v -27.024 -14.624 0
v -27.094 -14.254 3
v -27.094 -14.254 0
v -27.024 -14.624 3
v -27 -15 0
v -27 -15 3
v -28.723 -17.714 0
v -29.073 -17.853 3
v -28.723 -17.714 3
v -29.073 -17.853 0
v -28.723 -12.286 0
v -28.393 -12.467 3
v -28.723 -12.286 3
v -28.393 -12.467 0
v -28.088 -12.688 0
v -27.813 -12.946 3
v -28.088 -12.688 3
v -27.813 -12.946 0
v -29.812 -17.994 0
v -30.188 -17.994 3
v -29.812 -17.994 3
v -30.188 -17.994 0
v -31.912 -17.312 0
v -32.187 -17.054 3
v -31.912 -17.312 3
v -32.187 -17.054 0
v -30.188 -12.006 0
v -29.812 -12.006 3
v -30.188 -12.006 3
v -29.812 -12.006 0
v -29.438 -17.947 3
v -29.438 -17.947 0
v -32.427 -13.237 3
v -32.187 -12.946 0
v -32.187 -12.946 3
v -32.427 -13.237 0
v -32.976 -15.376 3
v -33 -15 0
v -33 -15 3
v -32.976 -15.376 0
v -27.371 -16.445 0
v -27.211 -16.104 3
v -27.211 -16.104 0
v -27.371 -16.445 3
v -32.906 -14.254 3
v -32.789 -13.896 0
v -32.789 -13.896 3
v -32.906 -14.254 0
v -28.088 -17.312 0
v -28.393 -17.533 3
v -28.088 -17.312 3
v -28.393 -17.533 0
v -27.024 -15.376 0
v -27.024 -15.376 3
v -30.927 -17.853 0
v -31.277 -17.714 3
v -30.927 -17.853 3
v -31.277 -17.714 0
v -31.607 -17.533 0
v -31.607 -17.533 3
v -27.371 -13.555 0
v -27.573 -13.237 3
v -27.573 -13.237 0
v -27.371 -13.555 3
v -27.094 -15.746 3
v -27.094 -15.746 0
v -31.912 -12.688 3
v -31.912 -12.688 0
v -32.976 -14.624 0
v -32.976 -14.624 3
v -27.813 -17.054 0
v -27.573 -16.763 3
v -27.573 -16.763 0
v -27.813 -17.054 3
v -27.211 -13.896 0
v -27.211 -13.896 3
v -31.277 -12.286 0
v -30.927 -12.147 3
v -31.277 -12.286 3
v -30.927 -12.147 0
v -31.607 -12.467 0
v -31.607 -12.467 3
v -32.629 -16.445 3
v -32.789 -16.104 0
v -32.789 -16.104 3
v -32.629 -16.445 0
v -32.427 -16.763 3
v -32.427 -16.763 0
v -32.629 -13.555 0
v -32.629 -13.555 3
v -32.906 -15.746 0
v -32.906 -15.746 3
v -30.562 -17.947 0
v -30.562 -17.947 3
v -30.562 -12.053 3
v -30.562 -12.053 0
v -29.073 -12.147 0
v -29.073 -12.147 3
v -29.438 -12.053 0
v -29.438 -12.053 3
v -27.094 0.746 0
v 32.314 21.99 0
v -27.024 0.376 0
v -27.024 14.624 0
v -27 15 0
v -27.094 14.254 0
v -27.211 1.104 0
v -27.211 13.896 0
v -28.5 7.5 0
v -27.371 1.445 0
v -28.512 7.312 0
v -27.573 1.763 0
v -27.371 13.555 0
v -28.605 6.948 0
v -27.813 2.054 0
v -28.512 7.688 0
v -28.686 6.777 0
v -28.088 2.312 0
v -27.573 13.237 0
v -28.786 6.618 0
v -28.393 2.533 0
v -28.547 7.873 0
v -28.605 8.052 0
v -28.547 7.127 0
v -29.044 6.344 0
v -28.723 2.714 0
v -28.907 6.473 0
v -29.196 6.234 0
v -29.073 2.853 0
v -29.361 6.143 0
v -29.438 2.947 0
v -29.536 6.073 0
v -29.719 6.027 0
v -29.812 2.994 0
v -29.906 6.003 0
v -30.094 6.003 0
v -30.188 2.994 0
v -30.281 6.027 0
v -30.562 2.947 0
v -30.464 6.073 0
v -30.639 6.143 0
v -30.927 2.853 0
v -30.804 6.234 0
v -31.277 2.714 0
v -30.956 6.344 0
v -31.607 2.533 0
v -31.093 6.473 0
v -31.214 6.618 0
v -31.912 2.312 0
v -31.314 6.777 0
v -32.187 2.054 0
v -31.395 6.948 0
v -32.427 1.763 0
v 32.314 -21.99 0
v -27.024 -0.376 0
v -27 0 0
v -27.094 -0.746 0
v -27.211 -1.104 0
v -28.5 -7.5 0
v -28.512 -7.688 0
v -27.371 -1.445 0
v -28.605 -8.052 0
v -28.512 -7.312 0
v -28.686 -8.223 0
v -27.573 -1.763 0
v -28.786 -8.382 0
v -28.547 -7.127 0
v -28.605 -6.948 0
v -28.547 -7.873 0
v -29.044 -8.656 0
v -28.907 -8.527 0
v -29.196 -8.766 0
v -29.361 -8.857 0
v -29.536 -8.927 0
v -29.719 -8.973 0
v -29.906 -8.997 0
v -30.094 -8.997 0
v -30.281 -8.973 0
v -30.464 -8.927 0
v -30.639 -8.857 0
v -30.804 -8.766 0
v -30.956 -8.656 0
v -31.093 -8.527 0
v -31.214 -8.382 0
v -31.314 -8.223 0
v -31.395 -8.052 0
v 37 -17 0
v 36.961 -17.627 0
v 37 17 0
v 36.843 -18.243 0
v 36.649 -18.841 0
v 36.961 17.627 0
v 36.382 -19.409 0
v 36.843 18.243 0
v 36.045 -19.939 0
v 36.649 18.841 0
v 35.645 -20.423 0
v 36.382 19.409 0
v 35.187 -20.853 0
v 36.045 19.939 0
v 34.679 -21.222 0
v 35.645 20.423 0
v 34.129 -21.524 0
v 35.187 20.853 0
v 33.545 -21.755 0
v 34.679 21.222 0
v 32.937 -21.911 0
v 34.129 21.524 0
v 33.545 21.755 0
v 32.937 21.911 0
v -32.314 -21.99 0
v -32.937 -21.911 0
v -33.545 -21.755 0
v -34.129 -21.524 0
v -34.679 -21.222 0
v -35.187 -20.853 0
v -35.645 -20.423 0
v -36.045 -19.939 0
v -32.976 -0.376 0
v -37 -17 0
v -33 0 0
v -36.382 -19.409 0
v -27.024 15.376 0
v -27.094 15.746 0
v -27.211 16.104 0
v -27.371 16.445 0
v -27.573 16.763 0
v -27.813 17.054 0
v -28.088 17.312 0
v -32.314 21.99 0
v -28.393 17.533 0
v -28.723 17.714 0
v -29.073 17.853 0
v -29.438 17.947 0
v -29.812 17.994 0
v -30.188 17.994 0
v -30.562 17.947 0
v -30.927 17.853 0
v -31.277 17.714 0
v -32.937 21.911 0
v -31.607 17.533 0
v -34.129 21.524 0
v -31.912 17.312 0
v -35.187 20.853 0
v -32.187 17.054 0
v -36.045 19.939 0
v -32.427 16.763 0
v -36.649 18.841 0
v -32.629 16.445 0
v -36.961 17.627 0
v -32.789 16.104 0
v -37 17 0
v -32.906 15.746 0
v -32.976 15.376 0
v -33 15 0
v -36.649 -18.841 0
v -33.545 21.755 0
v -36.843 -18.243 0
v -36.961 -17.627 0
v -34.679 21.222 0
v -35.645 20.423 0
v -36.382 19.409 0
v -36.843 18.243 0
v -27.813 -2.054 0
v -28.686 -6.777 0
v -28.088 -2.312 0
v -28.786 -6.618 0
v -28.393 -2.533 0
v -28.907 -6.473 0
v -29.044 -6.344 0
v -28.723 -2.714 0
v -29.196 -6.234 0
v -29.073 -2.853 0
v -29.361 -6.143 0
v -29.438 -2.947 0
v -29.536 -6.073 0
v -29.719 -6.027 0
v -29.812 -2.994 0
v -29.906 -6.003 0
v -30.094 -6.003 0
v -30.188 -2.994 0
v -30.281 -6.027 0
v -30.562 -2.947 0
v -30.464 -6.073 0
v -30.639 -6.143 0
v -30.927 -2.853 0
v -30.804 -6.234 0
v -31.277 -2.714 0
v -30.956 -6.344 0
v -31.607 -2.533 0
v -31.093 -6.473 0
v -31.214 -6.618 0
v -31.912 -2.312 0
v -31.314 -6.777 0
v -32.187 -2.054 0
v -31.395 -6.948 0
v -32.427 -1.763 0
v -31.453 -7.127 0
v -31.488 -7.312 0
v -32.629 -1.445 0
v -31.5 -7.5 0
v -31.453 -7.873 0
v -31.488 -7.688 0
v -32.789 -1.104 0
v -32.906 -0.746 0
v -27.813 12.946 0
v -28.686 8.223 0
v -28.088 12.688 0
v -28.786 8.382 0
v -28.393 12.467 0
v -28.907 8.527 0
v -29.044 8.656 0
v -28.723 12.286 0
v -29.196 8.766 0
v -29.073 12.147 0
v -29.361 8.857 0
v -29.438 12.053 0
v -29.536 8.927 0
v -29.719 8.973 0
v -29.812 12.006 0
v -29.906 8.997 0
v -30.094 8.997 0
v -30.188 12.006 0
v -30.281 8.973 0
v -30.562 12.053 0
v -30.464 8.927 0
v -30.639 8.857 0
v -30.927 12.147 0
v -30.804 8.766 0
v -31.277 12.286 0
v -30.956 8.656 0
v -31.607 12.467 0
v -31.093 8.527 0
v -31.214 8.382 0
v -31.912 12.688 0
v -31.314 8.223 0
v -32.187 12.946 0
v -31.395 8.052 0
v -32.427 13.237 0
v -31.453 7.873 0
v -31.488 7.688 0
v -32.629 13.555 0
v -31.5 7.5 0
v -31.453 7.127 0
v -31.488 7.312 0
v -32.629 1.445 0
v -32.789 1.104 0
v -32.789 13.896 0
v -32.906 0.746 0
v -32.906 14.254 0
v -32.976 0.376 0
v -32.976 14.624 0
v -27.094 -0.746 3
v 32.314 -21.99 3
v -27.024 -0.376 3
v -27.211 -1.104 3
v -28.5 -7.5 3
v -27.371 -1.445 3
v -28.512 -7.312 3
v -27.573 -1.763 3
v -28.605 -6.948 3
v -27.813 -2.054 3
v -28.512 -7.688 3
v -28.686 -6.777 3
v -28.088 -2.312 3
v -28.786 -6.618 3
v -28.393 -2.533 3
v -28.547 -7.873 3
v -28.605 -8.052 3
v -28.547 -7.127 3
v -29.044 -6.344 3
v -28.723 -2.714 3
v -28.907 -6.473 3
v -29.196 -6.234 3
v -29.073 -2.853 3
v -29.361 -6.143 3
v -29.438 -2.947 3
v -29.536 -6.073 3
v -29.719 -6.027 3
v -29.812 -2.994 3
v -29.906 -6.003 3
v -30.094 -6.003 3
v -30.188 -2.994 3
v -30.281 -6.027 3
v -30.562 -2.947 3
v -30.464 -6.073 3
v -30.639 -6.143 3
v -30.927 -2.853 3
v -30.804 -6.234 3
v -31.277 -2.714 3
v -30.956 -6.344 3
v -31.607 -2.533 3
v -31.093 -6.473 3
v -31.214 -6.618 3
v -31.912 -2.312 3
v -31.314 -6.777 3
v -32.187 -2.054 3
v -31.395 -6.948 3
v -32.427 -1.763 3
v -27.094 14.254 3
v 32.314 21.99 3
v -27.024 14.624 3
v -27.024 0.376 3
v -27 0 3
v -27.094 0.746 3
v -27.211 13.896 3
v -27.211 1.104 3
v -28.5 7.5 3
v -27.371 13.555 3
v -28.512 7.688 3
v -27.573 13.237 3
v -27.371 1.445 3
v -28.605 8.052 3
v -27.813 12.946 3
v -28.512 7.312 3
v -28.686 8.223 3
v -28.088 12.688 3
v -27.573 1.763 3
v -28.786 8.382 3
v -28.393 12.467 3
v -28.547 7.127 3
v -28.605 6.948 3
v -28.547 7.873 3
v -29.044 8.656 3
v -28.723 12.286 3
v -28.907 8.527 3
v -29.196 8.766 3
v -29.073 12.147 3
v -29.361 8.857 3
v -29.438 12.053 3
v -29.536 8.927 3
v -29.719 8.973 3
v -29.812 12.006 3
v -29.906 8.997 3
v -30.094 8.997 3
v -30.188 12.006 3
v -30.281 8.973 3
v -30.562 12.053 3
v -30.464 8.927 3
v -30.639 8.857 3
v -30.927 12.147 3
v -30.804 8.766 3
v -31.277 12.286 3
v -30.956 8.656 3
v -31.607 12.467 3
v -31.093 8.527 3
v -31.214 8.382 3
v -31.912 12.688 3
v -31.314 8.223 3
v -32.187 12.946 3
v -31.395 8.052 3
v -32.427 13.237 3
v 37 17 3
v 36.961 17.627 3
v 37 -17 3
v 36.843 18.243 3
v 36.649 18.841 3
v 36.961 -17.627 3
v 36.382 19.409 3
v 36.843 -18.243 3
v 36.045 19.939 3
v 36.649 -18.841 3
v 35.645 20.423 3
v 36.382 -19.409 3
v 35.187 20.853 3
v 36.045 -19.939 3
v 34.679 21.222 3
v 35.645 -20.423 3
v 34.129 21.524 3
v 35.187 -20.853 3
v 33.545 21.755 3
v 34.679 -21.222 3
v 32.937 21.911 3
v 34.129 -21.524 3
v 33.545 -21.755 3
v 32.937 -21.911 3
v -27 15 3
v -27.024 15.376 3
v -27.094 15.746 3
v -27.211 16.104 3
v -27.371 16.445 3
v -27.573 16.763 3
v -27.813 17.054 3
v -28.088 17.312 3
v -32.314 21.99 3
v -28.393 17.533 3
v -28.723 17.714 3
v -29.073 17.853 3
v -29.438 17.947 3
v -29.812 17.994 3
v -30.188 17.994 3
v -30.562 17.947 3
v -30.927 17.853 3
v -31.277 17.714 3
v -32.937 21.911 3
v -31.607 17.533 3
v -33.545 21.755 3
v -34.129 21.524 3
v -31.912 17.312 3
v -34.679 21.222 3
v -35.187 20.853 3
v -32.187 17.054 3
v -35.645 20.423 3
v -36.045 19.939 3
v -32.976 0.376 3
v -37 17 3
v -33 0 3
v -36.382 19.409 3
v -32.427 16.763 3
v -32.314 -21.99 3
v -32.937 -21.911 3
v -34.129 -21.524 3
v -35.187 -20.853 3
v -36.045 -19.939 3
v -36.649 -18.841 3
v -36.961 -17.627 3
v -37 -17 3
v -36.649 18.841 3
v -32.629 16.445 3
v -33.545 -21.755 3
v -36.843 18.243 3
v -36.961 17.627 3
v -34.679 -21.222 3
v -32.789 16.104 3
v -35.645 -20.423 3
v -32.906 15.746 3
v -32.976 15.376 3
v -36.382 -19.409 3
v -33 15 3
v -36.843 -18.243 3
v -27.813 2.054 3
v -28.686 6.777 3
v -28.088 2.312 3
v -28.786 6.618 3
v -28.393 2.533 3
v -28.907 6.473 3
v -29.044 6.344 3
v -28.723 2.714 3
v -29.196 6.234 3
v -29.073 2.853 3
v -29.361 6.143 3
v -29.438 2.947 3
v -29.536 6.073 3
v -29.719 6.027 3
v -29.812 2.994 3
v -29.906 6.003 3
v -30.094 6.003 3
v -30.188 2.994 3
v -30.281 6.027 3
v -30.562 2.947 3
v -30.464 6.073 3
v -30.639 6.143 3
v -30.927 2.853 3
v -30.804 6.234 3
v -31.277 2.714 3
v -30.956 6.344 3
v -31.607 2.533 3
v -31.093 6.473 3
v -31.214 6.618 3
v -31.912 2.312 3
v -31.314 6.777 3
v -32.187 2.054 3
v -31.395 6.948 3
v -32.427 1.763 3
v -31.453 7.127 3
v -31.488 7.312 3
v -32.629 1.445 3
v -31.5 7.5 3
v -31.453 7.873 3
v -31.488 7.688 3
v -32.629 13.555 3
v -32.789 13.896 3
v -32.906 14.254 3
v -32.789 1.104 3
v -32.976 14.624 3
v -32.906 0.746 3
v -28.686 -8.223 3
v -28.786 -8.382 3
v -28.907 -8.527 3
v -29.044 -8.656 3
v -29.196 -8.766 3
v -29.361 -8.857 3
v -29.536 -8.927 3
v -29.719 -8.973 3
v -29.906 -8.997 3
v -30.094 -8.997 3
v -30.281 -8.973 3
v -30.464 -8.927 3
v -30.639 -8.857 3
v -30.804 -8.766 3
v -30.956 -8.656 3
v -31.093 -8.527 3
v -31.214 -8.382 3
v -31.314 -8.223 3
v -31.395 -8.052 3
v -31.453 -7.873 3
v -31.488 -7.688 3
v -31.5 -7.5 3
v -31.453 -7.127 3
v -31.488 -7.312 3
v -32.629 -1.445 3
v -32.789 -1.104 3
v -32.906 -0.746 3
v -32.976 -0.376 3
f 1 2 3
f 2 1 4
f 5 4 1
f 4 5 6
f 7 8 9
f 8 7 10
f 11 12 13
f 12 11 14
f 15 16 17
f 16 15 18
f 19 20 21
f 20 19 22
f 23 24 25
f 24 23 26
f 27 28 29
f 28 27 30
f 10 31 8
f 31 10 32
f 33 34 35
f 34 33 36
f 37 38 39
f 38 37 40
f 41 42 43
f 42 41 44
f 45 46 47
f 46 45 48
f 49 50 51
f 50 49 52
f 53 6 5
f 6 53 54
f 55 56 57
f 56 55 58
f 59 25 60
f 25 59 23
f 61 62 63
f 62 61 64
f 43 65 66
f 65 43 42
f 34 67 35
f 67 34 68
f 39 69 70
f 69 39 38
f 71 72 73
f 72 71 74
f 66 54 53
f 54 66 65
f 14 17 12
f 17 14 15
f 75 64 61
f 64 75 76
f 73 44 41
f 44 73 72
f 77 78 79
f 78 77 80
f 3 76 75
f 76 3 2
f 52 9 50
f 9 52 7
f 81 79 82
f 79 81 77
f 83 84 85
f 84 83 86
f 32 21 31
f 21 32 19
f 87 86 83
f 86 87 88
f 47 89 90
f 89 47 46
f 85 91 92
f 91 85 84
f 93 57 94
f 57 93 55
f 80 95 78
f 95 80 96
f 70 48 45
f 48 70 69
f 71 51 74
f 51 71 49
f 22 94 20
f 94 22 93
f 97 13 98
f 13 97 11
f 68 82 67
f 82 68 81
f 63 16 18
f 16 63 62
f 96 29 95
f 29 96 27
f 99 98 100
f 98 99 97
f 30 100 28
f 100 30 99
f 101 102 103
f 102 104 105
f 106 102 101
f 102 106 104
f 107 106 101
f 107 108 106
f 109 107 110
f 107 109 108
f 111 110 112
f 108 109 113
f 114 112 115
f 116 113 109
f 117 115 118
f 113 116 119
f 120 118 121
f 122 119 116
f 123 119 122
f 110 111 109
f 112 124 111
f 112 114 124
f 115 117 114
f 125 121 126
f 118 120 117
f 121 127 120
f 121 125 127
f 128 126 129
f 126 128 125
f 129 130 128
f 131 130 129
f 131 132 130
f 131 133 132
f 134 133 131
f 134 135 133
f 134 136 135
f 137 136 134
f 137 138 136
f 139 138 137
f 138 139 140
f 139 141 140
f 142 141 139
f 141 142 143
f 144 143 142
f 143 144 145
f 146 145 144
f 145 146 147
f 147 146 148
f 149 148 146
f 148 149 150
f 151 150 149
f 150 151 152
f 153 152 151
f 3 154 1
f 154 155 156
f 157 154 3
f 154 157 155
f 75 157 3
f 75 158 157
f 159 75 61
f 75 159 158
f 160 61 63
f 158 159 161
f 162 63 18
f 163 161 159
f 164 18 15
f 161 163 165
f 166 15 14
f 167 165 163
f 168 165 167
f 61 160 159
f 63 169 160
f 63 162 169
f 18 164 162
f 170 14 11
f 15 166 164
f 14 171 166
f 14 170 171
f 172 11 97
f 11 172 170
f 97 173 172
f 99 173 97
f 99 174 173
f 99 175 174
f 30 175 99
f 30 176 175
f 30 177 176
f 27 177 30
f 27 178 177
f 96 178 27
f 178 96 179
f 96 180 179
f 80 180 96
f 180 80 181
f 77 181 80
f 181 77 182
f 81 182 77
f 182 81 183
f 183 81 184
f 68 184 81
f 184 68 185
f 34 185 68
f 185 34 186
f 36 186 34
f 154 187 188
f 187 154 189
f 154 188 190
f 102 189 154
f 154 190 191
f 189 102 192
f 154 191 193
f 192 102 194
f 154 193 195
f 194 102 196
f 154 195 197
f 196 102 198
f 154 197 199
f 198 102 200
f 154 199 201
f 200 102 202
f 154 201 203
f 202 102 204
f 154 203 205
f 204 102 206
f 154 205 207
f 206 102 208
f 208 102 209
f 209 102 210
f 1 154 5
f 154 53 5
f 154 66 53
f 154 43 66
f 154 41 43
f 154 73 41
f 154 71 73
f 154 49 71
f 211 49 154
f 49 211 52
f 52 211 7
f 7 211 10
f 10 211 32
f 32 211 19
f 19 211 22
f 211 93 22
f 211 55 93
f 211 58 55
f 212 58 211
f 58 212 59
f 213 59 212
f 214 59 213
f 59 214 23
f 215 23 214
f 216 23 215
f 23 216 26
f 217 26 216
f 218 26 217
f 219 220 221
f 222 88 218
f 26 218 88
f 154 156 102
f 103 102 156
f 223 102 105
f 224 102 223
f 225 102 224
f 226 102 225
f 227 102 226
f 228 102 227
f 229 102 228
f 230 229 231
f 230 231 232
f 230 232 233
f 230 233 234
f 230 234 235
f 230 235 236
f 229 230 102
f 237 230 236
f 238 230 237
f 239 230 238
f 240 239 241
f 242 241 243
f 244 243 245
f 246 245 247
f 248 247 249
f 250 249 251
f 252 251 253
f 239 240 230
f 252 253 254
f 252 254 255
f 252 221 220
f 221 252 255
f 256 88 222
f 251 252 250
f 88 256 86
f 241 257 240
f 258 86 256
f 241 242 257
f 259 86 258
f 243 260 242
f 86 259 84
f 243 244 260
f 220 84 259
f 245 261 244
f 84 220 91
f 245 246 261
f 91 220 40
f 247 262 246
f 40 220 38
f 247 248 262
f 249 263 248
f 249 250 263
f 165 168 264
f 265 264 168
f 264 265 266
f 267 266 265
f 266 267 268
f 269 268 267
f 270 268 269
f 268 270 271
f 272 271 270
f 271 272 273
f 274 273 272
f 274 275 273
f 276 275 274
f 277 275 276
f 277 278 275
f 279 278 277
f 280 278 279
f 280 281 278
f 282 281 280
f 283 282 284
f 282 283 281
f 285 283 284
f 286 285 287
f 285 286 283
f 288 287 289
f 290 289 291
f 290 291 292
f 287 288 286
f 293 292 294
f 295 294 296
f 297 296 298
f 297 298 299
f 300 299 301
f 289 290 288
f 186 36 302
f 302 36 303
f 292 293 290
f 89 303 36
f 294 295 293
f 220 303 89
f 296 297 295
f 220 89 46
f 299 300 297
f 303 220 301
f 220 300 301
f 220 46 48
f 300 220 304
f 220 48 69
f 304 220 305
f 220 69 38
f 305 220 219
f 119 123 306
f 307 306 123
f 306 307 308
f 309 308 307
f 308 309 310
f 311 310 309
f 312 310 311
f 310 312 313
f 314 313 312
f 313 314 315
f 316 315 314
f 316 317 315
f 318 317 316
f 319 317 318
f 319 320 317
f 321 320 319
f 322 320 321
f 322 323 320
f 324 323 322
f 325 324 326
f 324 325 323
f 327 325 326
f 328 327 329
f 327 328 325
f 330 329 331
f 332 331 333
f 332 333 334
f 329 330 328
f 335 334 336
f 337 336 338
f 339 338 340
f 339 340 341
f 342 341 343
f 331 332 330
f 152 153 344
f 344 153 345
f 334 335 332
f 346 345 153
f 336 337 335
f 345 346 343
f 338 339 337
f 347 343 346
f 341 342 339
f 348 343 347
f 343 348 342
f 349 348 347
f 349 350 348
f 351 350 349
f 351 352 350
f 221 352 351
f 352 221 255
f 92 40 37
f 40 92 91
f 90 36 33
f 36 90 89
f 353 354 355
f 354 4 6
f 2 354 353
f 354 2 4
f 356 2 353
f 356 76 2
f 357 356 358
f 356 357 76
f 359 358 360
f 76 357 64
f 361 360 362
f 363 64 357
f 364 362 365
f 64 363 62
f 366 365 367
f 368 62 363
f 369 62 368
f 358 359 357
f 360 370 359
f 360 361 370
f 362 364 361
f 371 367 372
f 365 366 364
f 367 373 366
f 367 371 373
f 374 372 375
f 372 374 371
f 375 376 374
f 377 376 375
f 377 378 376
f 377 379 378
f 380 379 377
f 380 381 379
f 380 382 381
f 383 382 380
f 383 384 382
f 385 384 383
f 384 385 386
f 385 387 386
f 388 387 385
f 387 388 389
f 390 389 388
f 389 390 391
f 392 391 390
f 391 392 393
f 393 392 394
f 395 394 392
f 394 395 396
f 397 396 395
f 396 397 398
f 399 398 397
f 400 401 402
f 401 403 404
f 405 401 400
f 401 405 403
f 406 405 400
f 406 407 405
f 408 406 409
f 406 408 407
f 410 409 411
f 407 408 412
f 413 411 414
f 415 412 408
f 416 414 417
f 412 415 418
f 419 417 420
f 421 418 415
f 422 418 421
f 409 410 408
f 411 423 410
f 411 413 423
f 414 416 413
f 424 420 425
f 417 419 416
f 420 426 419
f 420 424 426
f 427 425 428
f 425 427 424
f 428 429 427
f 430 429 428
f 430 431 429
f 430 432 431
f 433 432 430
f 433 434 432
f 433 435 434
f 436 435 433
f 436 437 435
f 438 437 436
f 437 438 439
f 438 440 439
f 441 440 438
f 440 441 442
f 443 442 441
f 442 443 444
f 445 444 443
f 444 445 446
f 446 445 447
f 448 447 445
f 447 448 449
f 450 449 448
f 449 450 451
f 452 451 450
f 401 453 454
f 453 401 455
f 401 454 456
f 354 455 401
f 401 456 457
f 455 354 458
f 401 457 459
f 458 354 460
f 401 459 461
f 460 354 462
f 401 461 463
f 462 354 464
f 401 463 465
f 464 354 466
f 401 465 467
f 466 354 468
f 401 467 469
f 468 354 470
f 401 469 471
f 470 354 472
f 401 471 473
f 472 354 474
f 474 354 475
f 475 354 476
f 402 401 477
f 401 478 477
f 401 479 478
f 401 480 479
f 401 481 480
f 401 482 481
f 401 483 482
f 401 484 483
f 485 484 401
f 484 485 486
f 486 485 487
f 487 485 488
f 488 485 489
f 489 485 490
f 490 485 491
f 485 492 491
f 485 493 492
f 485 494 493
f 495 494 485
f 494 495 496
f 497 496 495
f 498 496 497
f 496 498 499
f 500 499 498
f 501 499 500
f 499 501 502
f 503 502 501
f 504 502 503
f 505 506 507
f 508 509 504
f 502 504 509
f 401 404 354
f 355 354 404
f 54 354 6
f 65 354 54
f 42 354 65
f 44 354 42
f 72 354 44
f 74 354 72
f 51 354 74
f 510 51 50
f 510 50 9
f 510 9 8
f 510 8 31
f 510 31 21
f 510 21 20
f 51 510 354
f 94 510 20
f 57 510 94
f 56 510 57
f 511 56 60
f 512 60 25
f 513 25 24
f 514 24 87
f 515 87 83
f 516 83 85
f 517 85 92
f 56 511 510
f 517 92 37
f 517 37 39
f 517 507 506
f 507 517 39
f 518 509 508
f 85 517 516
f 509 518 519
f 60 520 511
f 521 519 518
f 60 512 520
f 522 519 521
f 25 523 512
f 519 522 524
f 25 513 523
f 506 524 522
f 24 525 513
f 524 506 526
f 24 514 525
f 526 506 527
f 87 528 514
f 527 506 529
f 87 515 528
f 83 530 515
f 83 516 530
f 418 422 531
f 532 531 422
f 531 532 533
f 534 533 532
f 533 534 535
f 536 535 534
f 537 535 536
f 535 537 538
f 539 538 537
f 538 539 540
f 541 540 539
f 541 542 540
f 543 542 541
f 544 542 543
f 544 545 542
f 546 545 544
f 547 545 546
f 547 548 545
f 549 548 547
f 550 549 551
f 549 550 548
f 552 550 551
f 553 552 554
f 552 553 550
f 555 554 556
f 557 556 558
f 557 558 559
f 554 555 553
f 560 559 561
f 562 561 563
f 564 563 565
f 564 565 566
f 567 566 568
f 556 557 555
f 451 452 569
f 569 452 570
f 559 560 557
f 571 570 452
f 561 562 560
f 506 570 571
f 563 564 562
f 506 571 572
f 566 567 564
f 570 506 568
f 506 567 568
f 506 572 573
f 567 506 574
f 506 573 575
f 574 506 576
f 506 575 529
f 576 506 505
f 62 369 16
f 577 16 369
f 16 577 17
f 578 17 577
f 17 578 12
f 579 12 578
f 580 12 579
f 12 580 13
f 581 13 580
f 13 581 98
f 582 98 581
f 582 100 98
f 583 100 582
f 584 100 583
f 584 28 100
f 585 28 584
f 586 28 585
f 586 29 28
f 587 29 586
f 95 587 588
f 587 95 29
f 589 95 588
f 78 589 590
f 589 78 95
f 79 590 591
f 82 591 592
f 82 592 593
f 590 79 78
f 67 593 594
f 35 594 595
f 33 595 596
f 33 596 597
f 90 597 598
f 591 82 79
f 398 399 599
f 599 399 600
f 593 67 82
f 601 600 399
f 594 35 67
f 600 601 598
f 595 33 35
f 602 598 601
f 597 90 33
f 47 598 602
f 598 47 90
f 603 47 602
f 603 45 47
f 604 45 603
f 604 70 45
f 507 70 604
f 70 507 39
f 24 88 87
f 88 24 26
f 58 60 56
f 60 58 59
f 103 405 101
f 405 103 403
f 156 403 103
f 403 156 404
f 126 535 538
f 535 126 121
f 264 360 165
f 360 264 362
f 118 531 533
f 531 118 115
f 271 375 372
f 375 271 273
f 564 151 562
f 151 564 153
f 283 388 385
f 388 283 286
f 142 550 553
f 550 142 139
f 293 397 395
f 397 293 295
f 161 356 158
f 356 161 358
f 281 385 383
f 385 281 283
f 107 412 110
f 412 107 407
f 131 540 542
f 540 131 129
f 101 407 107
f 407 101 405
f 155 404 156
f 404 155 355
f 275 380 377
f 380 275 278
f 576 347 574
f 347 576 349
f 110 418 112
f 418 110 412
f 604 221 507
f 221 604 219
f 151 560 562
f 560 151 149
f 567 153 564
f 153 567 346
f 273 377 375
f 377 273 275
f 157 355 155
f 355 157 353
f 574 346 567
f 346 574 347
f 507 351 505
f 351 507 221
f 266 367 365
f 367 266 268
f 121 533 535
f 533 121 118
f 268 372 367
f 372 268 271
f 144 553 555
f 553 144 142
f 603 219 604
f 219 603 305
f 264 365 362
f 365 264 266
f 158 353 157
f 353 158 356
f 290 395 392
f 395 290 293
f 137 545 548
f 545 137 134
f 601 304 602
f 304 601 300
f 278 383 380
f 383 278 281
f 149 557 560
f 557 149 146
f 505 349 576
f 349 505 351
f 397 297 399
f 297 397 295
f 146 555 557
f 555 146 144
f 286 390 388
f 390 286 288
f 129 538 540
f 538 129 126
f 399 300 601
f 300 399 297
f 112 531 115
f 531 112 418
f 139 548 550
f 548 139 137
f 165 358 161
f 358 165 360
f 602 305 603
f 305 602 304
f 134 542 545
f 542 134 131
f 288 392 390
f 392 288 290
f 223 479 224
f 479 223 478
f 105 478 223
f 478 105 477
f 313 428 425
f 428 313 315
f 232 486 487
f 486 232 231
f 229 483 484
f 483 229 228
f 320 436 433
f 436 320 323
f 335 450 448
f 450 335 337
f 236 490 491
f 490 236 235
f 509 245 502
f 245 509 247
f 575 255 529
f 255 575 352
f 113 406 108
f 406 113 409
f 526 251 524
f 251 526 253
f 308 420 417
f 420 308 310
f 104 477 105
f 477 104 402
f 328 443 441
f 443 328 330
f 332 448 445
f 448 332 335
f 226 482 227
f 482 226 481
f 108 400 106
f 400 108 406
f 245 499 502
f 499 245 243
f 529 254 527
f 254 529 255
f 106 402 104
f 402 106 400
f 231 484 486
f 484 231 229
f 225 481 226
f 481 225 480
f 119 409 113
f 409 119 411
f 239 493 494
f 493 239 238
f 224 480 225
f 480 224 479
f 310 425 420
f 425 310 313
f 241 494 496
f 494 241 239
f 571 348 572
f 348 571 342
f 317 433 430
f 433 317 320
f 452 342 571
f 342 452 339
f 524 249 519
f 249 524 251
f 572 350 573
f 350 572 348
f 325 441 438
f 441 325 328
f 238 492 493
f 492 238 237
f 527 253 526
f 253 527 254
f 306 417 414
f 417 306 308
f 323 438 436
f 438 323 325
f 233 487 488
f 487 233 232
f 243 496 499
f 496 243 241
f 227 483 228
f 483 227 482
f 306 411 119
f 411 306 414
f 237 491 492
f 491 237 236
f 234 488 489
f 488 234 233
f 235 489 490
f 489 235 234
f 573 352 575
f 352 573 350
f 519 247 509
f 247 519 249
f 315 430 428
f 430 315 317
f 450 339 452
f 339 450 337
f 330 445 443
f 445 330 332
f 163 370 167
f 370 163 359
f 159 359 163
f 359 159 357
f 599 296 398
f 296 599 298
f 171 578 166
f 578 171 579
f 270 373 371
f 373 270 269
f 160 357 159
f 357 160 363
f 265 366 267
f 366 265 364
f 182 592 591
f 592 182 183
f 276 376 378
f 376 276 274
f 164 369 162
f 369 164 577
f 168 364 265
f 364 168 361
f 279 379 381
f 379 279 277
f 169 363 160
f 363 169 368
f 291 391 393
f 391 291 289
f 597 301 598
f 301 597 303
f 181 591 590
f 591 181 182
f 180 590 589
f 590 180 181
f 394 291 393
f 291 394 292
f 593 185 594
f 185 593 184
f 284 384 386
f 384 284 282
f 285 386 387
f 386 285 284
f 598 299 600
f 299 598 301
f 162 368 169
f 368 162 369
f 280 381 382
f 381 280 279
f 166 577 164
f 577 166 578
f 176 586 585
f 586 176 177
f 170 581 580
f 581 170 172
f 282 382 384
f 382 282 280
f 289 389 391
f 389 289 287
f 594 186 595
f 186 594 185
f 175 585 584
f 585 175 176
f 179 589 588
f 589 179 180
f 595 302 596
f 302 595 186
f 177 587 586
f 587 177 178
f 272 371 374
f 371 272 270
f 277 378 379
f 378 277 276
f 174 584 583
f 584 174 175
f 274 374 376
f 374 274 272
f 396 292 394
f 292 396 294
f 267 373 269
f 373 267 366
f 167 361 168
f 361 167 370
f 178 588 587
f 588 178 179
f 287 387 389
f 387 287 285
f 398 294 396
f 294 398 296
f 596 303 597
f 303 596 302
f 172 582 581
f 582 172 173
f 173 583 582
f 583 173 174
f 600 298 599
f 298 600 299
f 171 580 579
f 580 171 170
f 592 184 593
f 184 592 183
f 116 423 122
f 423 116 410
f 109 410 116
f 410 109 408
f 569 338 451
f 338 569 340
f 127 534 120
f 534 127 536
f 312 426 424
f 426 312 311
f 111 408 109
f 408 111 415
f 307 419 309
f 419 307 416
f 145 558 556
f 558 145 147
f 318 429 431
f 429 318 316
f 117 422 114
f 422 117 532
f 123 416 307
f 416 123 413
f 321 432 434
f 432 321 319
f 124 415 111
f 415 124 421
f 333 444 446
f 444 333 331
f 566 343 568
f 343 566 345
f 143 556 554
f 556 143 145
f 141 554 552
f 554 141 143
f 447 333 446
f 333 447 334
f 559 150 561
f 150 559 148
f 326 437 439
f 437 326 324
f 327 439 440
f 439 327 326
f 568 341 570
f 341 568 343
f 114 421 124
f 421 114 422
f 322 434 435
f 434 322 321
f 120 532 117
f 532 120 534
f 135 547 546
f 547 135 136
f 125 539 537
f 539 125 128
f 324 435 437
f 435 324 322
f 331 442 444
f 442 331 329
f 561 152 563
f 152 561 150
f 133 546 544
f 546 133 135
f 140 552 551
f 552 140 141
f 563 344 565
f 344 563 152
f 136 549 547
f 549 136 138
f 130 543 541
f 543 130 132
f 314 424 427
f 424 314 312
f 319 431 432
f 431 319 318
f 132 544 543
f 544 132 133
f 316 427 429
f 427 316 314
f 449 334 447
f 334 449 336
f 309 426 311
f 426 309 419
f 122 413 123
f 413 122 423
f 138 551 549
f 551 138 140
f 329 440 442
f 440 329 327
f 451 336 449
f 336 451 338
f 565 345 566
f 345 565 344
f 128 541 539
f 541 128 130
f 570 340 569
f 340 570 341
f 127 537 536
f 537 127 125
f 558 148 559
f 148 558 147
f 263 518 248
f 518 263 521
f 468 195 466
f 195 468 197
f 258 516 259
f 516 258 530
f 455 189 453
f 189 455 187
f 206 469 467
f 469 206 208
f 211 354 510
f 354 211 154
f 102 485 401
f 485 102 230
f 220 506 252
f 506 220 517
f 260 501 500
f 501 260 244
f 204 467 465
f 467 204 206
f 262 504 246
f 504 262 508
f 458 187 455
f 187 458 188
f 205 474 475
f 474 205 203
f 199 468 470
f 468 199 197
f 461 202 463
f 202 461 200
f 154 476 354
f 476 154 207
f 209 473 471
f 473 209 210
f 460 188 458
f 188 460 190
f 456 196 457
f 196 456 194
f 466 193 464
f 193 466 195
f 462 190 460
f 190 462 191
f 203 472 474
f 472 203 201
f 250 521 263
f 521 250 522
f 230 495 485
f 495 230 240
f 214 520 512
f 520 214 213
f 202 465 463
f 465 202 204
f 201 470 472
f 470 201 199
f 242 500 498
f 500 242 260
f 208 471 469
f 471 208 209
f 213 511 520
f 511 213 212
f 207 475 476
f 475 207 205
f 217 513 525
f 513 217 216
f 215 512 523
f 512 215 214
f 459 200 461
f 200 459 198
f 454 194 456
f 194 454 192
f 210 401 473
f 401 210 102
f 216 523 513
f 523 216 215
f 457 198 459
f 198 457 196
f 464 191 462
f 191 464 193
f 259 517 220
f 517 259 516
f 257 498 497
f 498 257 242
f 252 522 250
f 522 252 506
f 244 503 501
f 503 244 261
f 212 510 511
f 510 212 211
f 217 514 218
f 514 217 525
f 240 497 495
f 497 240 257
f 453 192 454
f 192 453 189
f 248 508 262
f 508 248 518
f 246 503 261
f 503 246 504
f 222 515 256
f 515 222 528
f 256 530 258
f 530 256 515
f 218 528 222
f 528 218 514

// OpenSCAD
$fn = 50;


difference() {
	union() {
		hull() {
			translate(v = [-32.0000000000, 17.0000000000, 0]) {
				cylinder(h = 3, r = 5);
			}
			translate(v = [32.0000000000, 17.0000000000, 0]) {
				cylinder(h = 3, r = 5);
			}
			translate(v = [-32.0000000000, -17.0000000000, 0]) {
				cylinder(h = 3, r = 5);
			}
			translate(v = [32.0000000000, -17.0000000000, 0]) {
				cylinder(h = 3, r = 5);
			}
		}
	}
	union() {
		translate(v = [-30.0000000000, -15.0000000000, 0]) {
			cylinder(h = 3, r = 3.0000000000);
		}
		translate(v = [-30.0000000000, 0.0000000000, 0]) {
			cylinder(h = 3, r = 3.0000000000);
		}
		translate(v = [-30.0000000000, 15.0000000000, 0]) {
			cylinder(h = 3, r = 3.0000000000);
		}
		translate(v = [-30.0000000000, -15.0000000000, 0]) {
			cylinder(h = 3, r = 1.5000000000);
		}
		translate(v = [-30.0000000000, -7.5000000000, 0]) {
			cylinder(h = 3, r = 1.5000000000);
		}
		translate(v = [-30.0000000000, 0.0000000000, 0]) {
			cylinder(h = 3, r = 1.5000000000);
		}
		translate(v = [-30.0000000000, 7.5000000000, 0]) {
			cylinder(h = 3, r = 1.5000000000);
		}
		translate(v = [-30.0000000000, 15.0000000000, 0]) {
			cylinder(h = 3, r = 1.5000000000);
		}
		translate(v = [-30.0000000000, -15.0000000000, 0]) {
			cylinder(h = 3, r = 1.5000000000);
		}
		translate(v = [-30.0000000000, -7.5000000000, 0]) {
			cylinder(h = 3, r = 1.5000000000);
		}
		translate(v = [-30.0000000000, 0.0000000000, 0]) {
			cylinder(h = 3, r = 1.5000000000);
		}
		translate(v = [-30.0000000000, 7.5000000000, 0]) {
			cylinder(h = 3, r = 1.5000000000);
		}
		translate(v = [-30.0000000000, 15.0000000000, 0]) {
			cylinder(h = 3, r = 1.5000000000);
		}
		translate(v = [-30.0000000000, -15.0000000000, 0]) {
			cylinder(h = 3, r = 1.5000000000);
		}
		translate(v = [-30.0000000000, -7.5000000000, 0]) {
			cylinder(h = 3, r = 1.5000000000);
		}
		translate(v = [-30.0000000000, 0.0000000000, 0]) {
			cylinder(h = 3, r = 1.5000000000);
		}
		translate(v = [-30.0000000000, 7.5000000000, 0]) {
			cylinder(h = 3, r = 1.5000000000);
		}
		translate(v = [-30.0000000000, 15.0000000000, 0]) {
			cylinder(h = 3, r = 1.5000000000);
		}
	}
}
